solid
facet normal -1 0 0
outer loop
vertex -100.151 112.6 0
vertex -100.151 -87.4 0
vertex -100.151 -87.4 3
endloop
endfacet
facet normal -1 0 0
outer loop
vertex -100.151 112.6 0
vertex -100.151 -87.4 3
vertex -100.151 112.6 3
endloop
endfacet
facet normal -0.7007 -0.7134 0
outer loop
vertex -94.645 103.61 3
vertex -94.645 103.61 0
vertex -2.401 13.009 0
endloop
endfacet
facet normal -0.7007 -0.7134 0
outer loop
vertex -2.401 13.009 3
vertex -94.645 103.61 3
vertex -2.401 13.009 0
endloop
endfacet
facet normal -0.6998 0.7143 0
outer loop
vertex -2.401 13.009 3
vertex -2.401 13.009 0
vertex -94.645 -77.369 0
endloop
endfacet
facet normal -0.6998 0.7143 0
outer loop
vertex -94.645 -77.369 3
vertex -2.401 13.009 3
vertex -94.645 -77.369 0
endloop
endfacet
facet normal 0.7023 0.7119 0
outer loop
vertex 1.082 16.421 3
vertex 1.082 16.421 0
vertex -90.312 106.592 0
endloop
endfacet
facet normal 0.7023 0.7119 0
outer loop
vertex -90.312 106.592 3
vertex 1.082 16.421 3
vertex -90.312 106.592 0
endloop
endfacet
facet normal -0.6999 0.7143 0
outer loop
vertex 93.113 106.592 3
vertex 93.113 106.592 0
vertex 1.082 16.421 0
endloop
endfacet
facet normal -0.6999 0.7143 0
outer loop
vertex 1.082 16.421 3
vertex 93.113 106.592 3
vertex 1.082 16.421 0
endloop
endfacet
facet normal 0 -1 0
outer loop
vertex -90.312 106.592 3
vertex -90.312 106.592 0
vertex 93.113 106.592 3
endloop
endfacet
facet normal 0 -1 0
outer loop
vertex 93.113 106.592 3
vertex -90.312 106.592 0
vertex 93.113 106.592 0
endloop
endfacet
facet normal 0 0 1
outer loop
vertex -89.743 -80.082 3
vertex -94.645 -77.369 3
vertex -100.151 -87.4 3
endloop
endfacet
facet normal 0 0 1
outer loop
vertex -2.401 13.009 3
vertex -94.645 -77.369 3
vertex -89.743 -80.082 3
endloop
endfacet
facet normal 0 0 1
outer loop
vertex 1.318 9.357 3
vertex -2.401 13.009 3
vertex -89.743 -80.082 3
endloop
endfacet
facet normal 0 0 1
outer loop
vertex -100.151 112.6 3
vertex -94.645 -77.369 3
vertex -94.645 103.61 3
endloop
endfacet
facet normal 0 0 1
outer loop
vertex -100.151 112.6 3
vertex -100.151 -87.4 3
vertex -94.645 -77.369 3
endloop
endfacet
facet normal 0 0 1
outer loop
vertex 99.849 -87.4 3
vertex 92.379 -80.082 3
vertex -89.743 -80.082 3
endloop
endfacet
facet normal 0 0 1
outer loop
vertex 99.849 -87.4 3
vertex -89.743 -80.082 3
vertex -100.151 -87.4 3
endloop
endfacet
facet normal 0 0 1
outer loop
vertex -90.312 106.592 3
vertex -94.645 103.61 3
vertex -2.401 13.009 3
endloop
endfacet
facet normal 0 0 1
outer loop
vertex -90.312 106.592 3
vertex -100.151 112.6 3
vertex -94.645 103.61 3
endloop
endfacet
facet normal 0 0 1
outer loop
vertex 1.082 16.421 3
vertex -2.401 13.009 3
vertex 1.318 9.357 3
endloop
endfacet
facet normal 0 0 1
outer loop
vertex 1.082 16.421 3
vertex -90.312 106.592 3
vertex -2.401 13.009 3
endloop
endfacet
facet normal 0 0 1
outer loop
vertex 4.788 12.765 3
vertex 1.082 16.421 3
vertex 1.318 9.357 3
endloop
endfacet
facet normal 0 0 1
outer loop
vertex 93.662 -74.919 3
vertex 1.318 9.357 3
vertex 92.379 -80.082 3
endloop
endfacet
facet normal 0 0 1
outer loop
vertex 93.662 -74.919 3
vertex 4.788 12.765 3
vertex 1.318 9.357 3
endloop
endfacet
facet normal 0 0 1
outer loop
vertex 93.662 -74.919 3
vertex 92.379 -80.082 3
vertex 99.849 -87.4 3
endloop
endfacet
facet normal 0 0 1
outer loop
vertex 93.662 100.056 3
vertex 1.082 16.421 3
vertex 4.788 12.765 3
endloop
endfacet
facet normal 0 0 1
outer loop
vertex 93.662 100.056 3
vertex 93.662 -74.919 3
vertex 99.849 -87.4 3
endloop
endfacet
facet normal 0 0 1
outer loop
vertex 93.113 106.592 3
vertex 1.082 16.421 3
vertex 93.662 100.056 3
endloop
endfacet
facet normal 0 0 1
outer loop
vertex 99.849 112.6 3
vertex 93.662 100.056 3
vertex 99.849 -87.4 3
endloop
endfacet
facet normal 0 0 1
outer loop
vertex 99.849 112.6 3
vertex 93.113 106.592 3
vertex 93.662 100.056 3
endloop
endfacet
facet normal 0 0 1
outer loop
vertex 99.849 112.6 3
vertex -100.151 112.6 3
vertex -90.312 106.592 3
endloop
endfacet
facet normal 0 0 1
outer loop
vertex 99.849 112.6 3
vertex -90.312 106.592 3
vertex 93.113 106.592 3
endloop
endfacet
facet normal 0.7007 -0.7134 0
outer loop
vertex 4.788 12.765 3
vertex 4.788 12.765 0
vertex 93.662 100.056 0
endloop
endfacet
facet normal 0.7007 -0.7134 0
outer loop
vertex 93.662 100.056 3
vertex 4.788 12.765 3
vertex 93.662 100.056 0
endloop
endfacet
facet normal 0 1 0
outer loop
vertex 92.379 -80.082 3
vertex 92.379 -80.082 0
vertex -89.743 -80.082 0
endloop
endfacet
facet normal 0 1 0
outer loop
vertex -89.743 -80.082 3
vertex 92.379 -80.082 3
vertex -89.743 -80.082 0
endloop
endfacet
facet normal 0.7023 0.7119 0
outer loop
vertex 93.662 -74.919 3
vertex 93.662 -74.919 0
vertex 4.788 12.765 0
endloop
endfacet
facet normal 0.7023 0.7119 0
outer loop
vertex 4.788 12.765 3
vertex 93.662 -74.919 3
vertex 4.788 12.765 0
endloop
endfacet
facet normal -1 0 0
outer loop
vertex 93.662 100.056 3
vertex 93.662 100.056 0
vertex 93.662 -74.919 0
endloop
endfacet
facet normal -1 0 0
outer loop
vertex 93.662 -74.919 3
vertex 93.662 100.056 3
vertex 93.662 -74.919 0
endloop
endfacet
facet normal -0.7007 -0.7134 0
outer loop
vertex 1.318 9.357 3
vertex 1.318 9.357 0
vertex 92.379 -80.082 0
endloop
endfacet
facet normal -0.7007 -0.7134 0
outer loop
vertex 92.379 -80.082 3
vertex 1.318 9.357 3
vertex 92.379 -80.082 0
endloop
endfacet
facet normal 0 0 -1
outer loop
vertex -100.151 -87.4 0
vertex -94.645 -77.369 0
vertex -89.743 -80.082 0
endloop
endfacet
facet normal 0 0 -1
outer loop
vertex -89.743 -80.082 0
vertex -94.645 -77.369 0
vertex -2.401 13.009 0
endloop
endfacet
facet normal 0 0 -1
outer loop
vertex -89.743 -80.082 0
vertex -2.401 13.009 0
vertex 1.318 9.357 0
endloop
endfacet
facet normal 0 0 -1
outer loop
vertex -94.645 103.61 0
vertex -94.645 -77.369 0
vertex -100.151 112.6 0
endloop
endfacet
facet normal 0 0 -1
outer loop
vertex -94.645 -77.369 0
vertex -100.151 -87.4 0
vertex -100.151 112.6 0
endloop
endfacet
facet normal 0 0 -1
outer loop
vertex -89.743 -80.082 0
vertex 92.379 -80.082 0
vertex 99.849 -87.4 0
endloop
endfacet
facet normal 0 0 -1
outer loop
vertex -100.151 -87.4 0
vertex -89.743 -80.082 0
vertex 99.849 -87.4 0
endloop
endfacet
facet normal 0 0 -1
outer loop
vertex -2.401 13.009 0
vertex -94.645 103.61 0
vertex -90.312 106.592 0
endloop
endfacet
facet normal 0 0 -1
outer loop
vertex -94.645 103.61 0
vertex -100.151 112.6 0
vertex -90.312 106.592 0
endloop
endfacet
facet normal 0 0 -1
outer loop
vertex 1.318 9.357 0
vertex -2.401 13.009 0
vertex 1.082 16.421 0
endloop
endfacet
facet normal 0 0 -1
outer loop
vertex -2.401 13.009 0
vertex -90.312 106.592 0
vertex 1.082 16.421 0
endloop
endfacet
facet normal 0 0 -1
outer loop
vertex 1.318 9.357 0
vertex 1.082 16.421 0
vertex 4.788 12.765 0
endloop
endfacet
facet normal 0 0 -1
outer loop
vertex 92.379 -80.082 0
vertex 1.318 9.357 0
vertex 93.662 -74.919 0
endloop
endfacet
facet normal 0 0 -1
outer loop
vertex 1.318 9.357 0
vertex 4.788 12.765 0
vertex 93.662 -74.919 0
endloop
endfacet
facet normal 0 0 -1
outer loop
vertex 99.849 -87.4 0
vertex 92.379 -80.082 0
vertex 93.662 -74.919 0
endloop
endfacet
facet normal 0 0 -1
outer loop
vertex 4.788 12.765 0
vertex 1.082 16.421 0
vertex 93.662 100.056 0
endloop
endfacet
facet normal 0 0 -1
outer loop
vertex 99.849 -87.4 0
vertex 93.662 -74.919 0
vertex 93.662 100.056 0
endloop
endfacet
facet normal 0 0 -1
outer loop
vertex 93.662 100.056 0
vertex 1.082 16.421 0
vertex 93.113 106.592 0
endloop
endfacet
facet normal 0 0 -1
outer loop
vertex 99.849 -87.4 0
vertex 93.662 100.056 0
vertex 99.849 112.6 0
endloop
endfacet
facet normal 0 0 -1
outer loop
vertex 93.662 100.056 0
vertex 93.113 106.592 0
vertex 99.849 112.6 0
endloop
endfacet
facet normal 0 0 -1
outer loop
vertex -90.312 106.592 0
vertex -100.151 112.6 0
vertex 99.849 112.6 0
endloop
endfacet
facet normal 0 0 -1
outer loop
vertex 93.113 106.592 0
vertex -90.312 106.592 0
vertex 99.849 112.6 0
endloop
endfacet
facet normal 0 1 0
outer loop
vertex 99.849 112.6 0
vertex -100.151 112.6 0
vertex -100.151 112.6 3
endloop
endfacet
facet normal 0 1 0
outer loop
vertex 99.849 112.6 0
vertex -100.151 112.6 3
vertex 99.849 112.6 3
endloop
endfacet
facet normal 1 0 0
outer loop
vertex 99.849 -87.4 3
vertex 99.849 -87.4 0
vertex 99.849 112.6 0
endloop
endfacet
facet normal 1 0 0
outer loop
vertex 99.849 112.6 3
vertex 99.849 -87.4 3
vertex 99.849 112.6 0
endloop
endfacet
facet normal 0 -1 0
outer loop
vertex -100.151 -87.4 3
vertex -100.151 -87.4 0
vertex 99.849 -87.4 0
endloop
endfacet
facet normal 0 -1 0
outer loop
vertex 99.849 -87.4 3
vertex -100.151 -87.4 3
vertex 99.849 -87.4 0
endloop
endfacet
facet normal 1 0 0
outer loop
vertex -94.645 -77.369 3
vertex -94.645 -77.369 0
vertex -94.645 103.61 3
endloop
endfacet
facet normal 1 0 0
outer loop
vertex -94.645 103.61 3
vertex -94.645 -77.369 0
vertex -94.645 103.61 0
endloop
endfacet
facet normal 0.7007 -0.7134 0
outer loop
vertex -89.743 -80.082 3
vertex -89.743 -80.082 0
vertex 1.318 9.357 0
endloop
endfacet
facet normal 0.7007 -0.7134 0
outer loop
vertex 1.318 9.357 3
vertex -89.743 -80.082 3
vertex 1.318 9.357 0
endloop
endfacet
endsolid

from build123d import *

# Parameters (mm, degrees)
F0_W     = 200
F0_H     = 200
F1_DEPTH = 3


with BuildPart() as f1:
    # F0 (on Top) → F1 (new body)
    with BuildSketch(Plane.XY):
        with Locations((-0.150979, 12.599895)):
            Rectangle(F0_W, F0_H)
        Polygon((92.378985, -80.081508), (-89.743175, -80.081508), (1.317902, 9.357106), align=None, mode=Mode.SUBTRACT)
        Polygon((4.787778, 12.765158), (93.662091, 100.05597), (93.662091, -74.918876), align=None, mode=Mode.SUBTRACT)
        Polygon((-94.644882, -77.369233), (-94.644882, 103.610084), (-2.40064, 13.009393), align=None, mode=Mode.SUBTRACT)
        Polygon((1.081851, 16.421451), (-90.312292, 106.591567), (93.11328, 106.591567), align=None, mode=Mode.SUBTRACT)
    extrude(amount=F1_DEPTH)


solid = f1.part
